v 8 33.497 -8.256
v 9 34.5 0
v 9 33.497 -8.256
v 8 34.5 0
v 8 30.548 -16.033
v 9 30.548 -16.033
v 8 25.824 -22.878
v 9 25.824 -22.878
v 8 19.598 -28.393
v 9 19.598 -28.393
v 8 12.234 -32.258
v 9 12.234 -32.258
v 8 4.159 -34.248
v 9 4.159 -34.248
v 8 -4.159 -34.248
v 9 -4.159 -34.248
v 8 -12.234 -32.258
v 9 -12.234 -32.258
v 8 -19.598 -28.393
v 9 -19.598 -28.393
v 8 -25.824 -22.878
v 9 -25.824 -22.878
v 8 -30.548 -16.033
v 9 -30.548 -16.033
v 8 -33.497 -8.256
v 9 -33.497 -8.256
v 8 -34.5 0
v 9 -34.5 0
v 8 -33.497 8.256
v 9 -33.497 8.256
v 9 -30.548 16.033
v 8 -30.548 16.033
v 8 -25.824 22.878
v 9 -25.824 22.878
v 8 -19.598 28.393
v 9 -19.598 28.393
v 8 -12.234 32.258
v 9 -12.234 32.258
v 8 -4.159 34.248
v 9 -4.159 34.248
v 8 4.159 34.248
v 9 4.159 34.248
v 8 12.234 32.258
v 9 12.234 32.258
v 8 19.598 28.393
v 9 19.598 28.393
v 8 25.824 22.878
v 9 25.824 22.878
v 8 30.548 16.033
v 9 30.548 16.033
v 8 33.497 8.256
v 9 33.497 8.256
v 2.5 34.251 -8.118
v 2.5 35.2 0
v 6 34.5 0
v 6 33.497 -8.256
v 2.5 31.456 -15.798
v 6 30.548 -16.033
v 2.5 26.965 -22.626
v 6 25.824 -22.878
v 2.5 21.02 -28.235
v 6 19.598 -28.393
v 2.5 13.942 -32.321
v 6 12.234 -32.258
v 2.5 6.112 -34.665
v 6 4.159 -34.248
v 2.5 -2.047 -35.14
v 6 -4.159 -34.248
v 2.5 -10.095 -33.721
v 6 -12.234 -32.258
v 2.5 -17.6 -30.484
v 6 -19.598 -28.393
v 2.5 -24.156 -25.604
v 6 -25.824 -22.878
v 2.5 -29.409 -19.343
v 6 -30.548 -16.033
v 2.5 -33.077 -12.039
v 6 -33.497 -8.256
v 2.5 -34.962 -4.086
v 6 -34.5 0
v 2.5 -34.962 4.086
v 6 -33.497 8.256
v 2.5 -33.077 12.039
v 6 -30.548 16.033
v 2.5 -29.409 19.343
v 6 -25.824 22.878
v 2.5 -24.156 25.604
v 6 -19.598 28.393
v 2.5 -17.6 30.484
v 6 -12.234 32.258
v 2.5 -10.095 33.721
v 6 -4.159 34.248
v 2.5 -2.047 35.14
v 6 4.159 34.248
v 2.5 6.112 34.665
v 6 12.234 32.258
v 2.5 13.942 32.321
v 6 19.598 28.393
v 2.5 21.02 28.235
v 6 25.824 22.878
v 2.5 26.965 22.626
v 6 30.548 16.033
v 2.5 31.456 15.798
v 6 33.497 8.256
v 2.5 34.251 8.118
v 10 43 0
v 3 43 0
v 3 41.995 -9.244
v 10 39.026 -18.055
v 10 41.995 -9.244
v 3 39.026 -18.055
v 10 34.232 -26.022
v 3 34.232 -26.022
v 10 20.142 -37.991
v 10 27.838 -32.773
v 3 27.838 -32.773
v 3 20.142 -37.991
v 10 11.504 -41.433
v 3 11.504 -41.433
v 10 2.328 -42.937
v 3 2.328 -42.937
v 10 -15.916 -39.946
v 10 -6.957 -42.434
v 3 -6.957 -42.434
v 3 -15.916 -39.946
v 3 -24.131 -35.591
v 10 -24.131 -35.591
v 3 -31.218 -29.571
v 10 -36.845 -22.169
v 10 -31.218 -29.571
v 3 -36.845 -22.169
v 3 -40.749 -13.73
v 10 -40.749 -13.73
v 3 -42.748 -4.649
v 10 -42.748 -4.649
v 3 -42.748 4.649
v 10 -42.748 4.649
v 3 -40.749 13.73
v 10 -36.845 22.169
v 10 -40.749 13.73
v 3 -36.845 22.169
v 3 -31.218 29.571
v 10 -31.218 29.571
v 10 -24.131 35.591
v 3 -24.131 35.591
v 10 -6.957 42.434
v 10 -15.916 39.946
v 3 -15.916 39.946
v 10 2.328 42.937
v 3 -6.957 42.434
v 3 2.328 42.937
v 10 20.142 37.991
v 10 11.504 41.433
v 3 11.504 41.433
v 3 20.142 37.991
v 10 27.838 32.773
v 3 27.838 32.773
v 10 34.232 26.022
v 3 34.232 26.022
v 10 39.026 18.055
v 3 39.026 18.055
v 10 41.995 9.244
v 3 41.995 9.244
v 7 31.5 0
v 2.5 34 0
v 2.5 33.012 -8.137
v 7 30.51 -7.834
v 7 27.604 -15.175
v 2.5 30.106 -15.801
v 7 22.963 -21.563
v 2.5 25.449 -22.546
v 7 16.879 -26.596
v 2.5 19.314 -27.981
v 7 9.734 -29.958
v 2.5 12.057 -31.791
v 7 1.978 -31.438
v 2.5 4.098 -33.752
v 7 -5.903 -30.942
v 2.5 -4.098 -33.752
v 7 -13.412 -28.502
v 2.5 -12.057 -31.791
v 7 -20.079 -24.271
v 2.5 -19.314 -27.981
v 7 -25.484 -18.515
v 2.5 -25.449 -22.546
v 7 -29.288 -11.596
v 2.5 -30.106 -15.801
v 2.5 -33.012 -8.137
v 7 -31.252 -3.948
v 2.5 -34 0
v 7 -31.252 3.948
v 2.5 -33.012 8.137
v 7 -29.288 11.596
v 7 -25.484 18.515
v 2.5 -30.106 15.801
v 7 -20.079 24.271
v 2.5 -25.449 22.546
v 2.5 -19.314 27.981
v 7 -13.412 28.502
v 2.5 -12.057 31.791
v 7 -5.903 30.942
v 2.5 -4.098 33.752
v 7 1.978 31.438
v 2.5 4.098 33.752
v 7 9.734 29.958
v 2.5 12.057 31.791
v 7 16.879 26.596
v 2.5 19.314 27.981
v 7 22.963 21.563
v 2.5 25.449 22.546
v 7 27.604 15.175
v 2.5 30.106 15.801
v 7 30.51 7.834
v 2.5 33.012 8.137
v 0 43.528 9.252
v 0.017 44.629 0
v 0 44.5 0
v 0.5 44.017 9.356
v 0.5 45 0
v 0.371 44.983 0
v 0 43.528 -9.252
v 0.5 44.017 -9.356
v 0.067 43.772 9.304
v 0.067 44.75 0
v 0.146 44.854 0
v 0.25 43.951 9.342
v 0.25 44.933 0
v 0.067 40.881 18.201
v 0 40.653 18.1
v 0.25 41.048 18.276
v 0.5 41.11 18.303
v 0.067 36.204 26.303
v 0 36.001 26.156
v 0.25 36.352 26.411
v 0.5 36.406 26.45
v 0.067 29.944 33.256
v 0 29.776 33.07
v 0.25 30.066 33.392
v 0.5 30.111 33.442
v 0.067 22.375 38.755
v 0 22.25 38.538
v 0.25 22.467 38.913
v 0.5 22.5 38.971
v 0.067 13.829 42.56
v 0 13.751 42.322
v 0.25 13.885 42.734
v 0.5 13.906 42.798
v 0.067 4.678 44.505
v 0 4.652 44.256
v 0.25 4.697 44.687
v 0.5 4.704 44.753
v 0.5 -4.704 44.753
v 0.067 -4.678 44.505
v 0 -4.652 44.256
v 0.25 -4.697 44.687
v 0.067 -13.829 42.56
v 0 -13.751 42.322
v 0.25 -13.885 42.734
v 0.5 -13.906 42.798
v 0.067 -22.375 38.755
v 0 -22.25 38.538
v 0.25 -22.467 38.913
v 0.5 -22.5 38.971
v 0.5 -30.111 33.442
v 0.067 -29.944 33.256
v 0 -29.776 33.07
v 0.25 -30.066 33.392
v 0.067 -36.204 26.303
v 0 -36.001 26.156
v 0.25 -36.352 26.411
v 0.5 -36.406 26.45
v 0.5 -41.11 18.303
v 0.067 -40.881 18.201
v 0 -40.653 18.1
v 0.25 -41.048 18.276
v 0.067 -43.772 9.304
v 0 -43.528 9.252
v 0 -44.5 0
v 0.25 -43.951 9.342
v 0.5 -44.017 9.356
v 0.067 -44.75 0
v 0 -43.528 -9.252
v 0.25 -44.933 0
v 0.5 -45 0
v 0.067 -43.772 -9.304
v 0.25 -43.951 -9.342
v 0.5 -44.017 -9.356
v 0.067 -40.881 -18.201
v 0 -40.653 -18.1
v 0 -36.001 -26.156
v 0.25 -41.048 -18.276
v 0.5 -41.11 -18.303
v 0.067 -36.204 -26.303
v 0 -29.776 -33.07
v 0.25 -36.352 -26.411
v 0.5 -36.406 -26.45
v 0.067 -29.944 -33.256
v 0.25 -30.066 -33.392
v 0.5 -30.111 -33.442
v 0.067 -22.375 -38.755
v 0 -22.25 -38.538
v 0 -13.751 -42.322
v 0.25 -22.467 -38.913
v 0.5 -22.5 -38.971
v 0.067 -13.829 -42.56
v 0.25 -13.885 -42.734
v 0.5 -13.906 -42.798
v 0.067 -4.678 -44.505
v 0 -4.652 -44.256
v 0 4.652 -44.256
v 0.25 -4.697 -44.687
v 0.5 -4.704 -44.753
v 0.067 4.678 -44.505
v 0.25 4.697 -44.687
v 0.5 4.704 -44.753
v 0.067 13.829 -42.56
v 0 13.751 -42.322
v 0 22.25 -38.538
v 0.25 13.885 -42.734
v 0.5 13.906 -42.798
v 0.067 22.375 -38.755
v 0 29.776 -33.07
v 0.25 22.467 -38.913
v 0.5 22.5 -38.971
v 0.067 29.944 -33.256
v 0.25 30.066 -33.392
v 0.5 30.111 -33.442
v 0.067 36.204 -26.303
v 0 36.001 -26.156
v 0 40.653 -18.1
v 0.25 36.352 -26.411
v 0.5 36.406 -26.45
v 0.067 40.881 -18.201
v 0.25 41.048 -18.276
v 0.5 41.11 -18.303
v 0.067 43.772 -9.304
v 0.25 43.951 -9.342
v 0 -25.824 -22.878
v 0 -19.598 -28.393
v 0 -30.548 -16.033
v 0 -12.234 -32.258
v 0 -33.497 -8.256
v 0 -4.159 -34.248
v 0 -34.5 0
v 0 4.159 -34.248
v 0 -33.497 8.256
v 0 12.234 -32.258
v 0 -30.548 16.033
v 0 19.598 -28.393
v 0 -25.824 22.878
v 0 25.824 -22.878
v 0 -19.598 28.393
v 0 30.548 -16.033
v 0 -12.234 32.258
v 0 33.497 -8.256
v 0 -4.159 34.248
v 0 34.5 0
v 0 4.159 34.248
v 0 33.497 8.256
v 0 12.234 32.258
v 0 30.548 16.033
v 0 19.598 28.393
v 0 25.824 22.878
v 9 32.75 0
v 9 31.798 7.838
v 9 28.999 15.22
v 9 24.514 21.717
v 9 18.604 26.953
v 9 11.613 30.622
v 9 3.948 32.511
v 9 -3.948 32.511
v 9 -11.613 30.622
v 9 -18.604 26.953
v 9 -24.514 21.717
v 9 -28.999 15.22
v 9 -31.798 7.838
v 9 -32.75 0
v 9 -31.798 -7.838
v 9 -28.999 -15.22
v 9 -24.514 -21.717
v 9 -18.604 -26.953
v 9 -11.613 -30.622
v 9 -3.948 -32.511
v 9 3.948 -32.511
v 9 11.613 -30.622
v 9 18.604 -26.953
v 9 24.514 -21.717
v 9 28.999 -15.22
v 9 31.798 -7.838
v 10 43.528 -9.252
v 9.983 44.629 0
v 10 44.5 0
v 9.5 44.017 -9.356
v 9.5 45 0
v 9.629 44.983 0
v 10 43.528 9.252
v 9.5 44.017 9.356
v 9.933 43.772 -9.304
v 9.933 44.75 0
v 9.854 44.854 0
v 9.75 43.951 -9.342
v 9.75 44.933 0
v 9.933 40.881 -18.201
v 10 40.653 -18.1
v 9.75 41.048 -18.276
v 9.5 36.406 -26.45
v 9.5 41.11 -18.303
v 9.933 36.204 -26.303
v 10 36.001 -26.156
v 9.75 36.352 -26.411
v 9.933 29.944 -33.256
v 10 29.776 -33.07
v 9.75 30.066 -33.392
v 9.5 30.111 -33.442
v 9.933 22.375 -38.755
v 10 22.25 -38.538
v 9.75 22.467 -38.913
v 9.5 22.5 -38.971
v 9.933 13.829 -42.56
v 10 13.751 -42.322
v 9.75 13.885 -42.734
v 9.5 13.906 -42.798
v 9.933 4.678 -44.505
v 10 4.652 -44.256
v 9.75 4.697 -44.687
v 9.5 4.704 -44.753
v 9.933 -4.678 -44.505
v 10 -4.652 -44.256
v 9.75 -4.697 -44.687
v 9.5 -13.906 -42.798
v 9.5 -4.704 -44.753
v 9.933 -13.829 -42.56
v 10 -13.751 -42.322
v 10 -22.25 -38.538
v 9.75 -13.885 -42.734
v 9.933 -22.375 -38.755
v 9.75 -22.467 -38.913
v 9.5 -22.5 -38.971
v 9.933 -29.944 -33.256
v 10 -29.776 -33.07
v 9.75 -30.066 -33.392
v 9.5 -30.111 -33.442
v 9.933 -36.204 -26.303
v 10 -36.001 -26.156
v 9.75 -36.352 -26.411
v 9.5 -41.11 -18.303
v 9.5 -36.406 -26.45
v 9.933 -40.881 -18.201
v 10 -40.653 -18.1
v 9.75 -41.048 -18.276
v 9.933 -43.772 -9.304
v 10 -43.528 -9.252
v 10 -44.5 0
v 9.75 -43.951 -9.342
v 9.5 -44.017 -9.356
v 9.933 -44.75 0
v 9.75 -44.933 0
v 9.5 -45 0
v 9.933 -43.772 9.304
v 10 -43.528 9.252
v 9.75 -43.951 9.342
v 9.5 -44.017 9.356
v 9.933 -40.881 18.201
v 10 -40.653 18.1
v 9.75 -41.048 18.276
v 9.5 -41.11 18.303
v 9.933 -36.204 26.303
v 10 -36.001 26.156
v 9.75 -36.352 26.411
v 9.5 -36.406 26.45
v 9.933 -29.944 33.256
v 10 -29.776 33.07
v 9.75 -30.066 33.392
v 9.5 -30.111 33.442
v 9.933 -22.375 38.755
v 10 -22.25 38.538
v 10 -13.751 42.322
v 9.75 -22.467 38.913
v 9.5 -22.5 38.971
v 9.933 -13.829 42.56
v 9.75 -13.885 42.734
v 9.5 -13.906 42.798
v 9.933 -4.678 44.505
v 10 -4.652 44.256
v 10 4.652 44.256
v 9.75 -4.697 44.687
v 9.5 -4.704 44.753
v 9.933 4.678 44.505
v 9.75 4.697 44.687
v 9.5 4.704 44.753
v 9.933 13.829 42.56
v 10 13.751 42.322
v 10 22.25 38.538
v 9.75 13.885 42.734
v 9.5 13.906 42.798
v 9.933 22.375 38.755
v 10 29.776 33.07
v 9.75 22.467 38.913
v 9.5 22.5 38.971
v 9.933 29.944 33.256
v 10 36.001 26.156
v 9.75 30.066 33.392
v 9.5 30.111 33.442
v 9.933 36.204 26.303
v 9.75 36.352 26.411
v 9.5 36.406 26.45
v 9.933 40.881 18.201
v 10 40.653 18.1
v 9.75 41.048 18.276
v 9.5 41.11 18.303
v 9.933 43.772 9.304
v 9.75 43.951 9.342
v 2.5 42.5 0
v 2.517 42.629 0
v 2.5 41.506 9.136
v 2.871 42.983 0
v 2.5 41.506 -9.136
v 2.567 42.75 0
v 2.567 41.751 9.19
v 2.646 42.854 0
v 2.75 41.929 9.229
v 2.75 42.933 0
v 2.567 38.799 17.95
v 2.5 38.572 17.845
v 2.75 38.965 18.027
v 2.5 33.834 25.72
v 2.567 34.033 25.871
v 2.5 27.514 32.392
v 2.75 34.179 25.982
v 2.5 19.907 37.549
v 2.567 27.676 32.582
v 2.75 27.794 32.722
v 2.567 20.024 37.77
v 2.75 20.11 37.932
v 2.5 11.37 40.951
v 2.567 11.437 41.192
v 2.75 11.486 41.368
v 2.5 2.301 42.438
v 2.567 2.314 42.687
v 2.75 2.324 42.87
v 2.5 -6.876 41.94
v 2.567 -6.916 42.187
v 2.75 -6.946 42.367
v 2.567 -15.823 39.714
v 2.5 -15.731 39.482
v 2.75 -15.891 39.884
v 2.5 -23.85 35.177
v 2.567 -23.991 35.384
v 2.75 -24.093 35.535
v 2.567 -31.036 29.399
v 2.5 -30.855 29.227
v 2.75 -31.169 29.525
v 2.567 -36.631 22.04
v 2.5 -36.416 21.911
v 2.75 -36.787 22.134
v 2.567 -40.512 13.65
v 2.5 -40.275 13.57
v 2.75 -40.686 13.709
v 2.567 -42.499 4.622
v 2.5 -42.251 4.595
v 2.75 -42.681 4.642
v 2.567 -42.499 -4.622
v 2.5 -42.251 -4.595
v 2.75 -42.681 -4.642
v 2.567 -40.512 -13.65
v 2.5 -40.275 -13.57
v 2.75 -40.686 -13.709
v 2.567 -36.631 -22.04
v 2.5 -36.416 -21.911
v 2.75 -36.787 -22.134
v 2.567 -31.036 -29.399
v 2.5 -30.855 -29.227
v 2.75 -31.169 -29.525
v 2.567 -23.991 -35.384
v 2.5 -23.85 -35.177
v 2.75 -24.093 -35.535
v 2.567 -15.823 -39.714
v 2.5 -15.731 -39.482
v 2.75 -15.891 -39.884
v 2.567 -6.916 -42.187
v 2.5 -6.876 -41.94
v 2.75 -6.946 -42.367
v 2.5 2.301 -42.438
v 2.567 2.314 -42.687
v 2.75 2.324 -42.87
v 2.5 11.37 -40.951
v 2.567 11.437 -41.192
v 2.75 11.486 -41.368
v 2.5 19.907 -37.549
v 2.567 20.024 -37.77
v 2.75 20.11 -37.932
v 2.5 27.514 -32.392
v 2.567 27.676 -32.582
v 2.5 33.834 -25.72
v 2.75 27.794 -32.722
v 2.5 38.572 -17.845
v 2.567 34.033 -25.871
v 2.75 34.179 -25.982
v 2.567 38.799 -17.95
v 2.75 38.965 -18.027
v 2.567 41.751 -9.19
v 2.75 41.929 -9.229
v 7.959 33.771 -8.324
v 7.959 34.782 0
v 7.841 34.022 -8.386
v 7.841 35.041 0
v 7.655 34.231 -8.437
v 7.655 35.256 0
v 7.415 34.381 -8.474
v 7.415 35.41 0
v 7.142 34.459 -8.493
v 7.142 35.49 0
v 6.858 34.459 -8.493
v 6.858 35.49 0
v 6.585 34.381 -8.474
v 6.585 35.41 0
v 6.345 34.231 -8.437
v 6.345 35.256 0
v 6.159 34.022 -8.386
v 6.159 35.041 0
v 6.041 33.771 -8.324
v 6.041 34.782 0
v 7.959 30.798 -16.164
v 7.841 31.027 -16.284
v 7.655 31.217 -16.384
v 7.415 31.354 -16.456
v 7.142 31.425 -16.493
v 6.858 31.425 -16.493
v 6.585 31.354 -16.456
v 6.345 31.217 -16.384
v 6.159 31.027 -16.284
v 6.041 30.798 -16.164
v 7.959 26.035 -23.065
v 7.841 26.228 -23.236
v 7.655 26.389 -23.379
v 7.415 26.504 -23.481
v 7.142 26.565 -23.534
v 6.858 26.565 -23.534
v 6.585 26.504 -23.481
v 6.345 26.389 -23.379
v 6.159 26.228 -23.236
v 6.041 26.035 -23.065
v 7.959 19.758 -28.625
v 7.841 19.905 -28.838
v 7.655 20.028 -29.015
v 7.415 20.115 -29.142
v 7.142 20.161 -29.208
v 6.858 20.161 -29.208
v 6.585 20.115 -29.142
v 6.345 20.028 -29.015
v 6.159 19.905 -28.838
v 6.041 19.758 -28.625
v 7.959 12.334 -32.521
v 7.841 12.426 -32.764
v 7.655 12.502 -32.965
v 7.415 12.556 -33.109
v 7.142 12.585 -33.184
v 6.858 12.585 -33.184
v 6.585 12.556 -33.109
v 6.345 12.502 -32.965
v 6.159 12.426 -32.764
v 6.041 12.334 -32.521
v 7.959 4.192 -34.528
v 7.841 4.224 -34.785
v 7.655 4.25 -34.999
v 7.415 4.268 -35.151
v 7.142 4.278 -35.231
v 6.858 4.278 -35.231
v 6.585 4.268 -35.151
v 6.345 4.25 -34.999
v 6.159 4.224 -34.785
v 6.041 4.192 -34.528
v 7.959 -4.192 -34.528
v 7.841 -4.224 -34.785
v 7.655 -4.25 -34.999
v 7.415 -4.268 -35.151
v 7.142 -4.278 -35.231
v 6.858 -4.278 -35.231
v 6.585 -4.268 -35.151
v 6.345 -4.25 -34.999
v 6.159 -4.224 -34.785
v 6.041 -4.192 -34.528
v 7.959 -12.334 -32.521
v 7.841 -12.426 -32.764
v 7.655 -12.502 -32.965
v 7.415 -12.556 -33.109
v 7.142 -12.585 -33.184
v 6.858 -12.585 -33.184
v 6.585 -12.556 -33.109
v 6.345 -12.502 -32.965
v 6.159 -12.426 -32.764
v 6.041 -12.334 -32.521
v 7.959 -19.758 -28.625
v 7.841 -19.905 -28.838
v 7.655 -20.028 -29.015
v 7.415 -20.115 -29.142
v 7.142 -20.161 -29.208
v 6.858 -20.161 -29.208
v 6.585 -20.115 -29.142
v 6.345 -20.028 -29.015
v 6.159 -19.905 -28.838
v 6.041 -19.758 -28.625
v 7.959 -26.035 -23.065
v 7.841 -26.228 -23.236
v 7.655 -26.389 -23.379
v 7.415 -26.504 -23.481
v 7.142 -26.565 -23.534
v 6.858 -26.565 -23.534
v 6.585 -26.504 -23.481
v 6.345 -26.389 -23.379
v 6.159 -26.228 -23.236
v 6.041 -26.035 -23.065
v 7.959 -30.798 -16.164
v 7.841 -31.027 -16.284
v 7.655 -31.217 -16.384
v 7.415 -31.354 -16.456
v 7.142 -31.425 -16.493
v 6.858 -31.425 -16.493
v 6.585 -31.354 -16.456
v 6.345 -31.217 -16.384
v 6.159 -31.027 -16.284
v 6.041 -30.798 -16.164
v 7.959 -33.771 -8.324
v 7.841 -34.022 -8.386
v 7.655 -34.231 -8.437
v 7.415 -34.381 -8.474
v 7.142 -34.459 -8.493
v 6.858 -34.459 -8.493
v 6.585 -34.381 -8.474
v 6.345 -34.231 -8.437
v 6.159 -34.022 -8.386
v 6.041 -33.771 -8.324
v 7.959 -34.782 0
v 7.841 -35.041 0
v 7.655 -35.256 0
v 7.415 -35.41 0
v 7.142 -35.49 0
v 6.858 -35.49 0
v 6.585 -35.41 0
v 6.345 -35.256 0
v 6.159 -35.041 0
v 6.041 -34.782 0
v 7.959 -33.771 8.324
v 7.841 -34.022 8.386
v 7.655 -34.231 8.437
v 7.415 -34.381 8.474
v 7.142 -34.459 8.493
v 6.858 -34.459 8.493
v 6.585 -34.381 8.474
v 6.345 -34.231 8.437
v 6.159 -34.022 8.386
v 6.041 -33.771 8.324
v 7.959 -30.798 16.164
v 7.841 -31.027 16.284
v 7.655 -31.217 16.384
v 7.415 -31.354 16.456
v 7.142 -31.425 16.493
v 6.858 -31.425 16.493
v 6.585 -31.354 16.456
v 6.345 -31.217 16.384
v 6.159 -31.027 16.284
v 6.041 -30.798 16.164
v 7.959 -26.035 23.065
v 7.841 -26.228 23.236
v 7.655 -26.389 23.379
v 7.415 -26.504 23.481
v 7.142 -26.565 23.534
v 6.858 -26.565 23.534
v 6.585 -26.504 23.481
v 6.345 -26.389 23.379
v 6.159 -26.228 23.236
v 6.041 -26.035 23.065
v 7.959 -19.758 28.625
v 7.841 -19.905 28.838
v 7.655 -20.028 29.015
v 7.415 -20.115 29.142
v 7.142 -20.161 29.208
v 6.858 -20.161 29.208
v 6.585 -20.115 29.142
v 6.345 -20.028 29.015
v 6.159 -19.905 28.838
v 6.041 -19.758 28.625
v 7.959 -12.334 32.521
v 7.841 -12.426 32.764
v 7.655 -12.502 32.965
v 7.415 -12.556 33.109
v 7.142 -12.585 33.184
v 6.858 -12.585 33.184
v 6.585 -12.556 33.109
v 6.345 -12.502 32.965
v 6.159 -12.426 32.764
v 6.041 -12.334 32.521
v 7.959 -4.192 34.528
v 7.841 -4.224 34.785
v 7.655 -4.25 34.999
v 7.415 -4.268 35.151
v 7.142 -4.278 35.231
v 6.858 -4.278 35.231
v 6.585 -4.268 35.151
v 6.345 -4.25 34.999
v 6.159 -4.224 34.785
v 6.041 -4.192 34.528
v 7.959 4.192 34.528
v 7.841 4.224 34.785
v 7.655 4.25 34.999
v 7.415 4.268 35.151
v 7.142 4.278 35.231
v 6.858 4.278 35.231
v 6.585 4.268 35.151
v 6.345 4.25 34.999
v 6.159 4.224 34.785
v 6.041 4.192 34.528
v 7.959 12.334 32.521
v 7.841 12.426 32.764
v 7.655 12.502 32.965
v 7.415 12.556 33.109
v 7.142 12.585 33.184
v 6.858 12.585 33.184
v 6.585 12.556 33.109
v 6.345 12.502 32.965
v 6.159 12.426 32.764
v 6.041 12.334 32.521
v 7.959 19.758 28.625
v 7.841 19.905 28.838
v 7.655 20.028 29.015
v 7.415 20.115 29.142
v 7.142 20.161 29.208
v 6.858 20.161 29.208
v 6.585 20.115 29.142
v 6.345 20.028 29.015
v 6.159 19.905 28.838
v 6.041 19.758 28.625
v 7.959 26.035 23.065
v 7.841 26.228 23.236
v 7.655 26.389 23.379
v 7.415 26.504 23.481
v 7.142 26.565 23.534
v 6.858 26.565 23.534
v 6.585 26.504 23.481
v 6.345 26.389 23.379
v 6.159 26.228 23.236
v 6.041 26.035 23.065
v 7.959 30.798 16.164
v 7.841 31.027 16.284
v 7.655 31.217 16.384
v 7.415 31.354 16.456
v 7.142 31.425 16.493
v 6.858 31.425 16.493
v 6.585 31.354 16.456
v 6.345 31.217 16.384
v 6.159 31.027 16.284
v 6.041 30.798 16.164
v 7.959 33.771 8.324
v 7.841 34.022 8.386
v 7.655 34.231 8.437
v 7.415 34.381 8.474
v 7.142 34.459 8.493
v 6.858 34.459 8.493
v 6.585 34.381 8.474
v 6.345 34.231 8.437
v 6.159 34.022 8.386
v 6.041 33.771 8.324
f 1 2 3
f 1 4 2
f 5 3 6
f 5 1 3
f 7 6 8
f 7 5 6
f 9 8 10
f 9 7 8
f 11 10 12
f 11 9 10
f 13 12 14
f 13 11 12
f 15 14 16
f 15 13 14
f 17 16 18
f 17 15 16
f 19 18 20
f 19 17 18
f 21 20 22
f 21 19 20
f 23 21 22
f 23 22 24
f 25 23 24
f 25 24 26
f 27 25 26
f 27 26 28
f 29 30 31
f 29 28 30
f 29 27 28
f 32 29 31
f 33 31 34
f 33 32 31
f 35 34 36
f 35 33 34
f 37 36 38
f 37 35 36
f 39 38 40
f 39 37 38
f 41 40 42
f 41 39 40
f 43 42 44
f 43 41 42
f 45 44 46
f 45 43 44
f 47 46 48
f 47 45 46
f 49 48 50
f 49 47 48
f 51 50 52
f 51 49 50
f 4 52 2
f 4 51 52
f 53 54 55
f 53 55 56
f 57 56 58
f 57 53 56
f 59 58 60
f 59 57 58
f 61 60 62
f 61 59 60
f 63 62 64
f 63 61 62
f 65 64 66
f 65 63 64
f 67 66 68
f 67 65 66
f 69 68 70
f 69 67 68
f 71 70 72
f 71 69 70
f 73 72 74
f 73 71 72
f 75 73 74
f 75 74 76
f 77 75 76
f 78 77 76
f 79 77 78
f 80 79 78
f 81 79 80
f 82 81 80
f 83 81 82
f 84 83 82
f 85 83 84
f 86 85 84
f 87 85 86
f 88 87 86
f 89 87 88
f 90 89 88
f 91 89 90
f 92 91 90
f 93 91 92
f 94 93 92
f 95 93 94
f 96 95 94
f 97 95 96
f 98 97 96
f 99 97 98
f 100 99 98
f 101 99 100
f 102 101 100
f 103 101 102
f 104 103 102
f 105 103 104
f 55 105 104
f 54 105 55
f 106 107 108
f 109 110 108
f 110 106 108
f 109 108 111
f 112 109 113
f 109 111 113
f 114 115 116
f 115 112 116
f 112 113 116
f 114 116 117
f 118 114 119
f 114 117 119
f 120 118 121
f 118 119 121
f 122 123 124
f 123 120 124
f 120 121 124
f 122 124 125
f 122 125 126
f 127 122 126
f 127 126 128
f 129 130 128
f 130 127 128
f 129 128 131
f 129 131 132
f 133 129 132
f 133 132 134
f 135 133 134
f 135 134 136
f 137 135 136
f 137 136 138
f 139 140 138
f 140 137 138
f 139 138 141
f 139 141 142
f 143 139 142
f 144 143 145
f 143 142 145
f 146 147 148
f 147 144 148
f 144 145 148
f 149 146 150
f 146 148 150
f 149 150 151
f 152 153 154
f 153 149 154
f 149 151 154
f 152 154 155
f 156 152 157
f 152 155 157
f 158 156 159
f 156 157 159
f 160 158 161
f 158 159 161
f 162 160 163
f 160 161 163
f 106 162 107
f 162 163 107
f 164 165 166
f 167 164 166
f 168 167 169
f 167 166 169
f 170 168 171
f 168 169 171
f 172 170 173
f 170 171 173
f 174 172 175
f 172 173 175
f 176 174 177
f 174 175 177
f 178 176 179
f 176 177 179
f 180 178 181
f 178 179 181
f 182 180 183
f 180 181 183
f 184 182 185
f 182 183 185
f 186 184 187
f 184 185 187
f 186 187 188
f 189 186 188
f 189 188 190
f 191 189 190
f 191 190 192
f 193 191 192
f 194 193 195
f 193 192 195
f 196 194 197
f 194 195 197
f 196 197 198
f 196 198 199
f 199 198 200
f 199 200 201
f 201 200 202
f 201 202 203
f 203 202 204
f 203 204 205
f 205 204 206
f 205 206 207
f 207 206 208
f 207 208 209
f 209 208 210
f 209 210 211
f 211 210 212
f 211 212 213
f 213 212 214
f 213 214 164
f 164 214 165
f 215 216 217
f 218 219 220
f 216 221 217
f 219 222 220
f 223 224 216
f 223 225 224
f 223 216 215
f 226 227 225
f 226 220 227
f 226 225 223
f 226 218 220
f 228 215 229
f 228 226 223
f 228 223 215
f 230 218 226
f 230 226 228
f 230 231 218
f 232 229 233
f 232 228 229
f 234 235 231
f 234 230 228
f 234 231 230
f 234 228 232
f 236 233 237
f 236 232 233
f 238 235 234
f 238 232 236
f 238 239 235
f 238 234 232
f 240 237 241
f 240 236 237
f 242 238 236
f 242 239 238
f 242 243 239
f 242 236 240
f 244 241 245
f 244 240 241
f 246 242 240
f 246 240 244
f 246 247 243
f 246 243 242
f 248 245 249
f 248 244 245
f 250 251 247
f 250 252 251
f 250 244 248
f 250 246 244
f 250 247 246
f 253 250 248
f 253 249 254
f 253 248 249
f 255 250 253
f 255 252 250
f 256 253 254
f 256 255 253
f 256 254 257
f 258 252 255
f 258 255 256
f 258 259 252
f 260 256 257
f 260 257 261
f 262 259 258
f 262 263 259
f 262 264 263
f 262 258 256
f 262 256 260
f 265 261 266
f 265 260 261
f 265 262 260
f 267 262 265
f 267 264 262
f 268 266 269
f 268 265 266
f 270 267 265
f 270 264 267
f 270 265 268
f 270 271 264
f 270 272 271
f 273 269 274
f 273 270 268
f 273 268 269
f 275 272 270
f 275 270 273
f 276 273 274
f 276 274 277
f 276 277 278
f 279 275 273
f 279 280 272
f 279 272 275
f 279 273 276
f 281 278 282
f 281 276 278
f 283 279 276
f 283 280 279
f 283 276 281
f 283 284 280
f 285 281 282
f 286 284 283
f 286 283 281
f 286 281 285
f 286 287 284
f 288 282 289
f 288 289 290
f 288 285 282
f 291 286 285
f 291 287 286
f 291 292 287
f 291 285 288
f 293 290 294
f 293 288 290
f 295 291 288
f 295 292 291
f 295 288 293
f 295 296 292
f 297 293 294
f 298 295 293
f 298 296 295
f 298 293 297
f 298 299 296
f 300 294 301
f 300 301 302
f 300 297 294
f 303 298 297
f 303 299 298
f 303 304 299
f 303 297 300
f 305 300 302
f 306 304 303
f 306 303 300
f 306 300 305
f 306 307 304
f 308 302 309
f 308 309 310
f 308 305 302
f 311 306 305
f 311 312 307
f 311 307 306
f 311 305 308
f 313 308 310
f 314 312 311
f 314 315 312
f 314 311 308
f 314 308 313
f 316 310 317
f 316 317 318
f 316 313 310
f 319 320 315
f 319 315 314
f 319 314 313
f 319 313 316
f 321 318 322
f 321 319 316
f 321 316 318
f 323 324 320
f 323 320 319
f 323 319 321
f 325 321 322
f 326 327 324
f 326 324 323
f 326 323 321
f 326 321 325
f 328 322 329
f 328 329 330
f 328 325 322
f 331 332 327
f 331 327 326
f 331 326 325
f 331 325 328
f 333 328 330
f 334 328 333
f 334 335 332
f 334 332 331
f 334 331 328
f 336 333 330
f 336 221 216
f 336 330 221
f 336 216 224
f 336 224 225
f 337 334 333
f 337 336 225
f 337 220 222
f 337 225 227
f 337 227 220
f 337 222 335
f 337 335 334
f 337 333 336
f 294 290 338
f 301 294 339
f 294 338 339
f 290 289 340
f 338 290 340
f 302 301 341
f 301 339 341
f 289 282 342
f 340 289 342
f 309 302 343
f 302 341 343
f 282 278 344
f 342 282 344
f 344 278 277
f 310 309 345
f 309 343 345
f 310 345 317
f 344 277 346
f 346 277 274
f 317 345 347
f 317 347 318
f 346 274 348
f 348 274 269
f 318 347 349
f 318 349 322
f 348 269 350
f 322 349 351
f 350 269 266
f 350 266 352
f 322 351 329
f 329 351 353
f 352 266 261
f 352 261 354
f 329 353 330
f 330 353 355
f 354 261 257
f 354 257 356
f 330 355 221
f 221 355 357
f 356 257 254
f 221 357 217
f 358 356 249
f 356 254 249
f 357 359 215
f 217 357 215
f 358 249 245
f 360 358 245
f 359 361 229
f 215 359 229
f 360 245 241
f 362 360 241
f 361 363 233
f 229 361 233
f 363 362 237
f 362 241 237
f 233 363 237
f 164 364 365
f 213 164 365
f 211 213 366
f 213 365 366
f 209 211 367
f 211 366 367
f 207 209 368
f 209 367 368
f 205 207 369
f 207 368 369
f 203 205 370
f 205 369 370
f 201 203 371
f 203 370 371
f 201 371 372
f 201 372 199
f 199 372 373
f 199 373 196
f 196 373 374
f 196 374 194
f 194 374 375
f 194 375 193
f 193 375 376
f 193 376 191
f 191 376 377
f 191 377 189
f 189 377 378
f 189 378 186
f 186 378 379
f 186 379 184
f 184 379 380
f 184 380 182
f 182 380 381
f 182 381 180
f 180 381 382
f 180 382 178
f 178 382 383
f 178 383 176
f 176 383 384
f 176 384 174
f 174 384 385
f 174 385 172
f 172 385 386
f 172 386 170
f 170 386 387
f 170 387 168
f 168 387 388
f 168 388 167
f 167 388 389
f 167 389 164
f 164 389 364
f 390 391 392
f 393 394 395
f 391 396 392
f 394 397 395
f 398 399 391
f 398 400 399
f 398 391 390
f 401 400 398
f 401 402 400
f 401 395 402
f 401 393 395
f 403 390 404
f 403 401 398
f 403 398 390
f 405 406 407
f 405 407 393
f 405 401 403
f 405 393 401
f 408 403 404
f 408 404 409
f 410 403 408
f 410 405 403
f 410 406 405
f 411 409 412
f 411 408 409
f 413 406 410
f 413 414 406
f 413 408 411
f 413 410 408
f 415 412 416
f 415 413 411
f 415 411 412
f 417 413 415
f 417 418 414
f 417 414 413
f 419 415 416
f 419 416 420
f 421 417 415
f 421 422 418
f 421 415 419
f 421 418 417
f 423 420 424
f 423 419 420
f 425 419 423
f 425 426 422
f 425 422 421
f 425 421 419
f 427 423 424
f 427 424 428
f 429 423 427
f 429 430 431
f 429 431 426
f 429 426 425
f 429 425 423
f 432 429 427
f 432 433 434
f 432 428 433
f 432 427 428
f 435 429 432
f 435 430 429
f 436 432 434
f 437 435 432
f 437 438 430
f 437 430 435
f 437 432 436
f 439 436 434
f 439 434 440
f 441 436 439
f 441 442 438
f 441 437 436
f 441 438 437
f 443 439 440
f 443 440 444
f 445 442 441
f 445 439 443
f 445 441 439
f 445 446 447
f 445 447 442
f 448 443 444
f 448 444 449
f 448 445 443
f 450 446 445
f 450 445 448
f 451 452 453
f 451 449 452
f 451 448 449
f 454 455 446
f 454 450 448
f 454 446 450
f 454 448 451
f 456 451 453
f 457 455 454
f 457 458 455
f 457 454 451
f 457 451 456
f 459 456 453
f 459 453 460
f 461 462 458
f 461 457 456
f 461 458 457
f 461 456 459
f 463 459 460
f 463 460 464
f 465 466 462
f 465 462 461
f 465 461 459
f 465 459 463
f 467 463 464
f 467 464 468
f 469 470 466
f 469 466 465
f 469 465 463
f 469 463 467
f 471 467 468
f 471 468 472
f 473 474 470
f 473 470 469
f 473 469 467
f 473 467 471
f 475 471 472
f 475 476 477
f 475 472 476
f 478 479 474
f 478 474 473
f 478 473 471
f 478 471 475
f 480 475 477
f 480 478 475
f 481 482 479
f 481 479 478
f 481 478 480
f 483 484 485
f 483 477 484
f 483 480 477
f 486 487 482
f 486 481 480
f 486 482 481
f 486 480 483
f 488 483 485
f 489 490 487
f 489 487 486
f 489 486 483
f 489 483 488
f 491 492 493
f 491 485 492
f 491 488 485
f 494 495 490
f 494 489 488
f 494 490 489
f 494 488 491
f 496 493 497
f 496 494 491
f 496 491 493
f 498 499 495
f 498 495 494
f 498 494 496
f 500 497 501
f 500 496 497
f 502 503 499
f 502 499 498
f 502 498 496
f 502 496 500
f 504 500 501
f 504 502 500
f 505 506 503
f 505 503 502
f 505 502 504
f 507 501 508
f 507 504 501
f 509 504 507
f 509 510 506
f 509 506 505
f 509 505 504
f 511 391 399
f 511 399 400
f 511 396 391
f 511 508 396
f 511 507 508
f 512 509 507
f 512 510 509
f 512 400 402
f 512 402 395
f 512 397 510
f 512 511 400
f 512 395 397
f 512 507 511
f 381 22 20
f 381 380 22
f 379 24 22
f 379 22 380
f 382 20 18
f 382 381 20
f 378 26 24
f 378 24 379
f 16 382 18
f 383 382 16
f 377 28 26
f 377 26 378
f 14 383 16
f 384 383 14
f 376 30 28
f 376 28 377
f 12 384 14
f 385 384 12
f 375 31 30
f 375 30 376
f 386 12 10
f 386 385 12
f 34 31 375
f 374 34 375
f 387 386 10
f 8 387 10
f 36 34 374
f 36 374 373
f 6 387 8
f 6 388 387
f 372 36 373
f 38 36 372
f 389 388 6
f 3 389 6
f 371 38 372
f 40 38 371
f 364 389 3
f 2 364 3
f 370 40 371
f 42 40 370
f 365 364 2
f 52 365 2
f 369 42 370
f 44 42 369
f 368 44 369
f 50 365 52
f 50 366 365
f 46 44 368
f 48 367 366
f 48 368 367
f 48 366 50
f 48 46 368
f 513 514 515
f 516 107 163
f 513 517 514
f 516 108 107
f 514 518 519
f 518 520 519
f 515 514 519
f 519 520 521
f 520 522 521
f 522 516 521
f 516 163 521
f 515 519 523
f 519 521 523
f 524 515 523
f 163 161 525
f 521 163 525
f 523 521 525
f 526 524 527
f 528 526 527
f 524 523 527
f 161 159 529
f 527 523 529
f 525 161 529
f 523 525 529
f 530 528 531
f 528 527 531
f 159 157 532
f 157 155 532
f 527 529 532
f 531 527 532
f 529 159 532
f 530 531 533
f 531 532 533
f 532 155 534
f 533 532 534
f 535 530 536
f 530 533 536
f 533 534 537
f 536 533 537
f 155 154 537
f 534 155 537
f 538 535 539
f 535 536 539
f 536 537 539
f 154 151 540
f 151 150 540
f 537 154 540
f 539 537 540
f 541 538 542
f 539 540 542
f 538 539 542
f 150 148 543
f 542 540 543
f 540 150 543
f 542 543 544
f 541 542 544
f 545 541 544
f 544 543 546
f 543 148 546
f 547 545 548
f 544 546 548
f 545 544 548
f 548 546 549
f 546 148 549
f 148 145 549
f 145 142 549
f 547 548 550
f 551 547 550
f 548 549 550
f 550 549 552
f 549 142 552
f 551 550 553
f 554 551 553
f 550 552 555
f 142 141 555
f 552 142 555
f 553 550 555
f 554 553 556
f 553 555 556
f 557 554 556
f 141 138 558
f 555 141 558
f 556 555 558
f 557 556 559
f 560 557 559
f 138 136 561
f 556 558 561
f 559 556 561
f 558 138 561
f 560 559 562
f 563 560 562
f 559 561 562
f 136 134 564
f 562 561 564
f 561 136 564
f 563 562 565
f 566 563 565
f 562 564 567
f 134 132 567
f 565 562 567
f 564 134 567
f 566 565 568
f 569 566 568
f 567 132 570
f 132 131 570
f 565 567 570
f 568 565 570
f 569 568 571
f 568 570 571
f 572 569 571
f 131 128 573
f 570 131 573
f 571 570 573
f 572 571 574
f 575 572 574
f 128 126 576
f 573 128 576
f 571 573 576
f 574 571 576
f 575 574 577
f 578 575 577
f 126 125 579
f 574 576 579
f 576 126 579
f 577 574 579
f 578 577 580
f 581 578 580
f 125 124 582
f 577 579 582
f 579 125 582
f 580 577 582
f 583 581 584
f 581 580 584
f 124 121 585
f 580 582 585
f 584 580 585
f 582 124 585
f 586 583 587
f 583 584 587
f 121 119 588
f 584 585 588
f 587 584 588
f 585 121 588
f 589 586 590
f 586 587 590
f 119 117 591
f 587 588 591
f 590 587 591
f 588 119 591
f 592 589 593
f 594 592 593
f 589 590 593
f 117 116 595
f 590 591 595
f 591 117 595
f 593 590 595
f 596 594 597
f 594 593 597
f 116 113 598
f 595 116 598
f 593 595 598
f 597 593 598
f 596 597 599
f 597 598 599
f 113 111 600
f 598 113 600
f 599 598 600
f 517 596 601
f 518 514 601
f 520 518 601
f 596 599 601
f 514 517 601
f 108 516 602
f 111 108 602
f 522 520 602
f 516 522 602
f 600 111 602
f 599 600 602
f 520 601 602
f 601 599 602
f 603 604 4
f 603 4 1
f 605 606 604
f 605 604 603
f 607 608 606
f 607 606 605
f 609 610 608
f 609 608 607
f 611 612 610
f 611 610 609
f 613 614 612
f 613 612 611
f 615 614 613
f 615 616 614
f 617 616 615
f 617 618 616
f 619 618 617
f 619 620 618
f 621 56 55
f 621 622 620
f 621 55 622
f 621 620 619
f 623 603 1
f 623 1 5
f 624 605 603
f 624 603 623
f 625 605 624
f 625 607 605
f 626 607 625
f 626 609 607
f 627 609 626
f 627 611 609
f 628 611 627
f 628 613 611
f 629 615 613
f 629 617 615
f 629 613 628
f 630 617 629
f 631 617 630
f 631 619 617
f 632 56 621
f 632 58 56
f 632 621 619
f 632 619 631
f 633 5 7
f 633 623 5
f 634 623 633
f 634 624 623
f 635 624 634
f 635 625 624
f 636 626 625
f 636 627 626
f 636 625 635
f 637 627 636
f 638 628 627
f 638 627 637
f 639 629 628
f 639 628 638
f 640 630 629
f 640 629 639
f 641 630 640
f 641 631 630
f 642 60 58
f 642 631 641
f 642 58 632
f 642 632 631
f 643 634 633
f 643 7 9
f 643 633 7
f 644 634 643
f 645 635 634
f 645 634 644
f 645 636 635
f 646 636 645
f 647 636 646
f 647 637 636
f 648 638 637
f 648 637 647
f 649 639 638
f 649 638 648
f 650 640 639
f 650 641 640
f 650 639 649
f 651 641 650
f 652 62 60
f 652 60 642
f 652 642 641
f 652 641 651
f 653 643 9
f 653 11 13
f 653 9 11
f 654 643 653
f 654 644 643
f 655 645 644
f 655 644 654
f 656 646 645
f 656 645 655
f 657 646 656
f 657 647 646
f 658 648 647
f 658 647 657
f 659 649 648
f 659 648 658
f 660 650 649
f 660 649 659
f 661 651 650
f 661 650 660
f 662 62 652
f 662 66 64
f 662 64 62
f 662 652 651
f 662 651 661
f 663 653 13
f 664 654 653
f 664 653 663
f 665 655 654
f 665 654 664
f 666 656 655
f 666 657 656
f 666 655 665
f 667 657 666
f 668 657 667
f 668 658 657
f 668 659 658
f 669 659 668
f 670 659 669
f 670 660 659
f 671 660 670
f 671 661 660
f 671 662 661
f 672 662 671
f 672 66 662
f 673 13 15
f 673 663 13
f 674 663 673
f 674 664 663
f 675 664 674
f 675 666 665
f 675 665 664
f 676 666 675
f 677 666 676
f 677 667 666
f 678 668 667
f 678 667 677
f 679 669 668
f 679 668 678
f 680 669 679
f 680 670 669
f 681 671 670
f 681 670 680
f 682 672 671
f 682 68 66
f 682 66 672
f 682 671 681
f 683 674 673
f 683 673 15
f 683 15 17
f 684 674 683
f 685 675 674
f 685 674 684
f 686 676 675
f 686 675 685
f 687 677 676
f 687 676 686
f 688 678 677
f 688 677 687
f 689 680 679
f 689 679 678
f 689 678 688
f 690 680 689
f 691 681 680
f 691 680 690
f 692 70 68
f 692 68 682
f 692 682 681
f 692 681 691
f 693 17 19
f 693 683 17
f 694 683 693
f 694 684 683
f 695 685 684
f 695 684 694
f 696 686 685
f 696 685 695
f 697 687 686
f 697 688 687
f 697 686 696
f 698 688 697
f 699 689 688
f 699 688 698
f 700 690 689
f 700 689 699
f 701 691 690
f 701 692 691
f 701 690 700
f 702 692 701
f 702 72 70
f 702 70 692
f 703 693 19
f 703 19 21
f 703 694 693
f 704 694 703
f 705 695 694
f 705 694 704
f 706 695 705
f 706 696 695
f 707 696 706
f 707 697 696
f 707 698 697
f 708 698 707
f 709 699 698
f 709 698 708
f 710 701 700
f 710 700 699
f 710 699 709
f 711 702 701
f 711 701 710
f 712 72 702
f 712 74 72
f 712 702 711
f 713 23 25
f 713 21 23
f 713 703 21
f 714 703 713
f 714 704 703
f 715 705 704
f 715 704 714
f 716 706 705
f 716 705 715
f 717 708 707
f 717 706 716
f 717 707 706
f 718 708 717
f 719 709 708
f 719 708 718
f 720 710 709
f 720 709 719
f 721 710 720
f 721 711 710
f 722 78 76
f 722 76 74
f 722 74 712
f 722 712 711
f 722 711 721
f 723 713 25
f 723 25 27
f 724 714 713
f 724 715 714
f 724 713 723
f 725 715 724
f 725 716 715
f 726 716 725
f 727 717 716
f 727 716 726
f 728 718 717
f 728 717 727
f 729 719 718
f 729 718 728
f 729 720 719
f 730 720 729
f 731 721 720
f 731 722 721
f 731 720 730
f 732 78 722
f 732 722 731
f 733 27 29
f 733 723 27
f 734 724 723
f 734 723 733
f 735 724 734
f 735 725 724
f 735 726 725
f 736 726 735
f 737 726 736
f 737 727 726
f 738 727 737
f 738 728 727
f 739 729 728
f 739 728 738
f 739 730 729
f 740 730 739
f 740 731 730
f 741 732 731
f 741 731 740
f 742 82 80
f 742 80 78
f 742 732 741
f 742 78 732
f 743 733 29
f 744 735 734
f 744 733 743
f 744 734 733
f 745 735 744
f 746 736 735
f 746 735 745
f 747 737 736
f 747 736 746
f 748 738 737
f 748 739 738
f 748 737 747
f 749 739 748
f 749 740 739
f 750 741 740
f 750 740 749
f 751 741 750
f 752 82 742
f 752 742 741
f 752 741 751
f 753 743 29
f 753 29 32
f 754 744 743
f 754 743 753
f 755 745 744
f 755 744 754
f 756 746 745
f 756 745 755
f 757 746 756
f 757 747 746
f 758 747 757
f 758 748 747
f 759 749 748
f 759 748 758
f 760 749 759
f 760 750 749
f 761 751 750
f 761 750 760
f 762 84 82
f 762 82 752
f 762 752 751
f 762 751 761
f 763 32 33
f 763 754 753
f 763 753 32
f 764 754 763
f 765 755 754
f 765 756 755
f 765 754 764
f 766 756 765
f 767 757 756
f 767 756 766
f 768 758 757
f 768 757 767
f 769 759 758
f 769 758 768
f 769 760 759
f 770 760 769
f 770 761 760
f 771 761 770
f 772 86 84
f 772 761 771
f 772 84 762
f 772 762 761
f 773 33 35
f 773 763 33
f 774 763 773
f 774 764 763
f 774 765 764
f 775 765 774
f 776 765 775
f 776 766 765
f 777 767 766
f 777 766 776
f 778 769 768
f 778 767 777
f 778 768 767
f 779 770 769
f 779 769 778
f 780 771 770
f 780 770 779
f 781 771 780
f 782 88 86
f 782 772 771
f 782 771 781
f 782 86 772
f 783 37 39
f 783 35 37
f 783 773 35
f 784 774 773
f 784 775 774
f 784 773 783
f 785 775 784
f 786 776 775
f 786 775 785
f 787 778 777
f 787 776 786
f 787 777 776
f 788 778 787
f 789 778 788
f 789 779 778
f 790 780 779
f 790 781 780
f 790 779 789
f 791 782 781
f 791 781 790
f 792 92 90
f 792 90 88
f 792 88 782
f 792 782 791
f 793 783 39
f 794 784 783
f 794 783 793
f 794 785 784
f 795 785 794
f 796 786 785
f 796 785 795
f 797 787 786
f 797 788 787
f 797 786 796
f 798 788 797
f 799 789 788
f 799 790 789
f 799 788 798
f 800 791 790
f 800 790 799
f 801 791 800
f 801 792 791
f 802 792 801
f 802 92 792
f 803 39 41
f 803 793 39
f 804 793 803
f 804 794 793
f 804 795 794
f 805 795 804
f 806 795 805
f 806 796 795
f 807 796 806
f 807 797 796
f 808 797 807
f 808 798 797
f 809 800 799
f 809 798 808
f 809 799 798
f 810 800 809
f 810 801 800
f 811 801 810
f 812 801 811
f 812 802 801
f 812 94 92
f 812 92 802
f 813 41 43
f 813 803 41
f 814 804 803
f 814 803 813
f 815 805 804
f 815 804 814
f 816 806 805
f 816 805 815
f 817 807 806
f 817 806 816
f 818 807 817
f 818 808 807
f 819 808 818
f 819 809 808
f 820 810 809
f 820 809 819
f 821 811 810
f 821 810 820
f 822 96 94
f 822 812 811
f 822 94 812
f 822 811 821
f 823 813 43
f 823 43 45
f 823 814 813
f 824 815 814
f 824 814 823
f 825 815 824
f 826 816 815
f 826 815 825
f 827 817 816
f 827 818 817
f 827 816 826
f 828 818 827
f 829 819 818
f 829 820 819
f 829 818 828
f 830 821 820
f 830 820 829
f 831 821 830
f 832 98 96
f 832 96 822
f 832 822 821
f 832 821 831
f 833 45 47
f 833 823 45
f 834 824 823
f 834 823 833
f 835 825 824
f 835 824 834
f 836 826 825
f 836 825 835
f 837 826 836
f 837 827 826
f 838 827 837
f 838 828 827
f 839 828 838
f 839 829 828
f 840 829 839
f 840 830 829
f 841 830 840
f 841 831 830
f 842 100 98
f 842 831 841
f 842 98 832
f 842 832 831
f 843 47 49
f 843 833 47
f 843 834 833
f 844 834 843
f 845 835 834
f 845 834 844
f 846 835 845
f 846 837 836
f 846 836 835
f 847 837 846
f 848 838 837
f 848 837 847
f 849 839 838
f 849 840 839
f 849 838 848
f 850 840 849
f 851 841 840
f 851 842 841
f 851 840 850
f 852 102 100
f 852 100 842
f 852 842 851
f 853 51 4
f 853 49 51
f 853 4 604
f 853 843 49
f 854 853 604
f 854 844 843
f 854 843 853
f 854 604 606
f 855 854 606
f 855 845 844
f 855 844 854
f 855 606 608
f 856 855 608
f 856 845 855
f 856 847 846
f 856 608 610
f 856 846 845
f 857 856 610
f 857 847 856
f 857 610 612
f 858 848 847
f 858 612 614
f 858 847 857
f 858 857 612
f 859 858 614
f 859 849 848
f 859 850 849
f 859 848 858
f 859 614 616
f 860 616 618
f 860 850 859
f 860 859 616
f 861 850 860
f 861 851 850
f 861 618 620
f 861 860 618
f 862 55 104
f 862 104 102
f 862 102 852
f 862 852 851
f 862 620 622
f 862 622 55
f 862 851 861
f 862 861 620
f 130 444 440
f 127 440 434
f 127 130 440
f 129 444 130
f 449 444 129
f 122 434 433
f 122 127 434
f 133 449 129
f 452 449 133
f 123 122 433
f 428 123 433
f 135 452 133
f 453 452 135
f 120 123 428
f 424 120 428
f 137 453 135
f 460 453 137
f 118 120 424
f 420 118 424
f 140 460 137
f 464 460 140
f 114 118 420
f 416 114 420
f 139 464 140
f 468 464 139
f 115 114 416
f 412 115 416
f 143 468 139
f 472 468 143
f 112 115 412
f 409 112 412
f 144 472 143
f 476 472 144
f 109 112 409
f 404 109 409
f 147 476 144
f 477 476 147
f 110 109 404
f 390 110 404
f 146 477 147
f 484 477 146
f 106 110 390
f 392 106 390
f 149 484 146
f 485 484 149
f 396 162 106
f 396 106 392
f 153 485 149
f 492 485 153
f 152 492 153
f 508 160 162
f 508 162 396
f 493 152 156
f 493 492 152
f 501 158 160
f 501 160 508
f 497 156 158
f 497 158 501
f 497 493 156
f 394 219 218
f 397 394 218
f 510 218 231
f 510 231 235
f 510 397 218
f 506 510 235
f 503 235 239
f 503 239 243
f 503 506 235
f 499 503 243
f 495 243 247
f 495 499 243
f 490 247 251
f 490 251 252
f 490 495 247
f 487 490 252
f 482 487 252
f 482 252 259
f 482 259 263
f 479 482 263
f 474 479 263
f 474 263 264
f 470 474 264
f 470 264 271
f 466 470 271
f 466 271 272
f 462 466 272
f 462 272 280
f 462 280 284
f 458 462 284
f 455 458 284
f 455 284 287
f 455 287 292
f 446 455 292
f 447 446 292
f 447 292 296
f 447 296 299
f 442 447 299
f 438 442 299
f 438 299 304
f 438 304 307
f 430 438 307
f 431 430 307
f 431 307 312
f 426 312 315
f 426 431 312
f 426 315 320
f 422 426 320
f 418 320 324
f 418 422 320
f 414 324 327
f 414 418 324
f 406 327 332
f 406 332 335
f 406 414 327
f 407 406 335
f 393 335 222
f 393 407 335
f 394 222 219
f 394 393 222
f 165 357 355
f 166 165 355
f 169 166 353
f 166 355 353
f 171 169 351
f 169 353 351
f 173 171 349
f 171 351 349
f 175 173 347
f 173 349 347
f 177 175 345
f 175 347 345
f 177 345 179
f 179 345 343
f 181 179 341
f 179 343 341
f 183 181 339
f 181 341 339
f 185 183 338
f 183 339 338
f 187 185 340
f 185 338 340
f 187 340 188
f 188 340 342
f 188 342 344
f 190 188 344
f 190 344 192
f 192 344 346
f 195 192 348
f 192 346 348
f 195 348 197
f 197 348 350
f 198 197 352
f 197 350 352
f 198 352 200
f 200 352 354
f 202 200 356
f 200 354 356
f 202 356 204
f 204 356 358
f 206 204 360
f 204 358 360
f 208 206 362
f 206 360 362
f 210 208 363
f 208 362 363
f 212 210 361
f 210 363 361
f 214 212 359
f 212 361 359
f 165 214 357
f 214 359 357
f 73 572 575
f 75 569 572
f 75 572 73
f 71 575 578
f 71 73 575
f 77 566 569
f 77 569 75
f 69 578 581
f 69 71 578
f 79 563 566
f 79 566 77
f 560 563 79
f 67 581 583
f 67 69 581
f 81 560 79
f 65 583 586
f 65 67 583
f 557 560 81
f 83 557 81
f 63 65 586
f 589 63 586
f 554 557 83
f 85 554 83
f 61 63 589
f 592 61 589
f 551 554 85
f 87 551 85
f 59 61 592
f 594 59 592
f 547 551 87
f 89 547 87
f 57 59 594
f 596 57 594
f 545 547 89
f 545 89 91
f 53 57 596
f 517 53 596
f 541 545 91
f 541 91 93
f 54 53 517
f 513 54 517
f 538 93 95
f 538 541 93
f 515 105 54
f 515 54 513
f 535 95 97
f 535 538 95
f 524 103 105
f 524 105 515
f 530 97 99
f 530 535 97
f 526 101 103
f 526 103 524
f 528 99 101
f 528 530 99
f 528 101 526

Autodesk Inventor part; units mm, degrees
ref_plane "YZ Plane" through (0, 0, 0) normal (1, 0, 0) x (0, 1, 0)
ref_plane "XZ Plane" through (0, 0, 0) normal (0, 1, 0) x (-1, 0, 0)
ref_plane "XY Plane" through (0, 0, 0) normal (0, 0, 1) x (1, 0, 0)
sketch "Skizze1" plane through (0, 0, 0) normal (0, 0, 1) x (1, 0, 0)
  circle A0 centre (7, 34.5) radius 0.65
  circle A1 centre (7, 34.5) radius 1
  line L0 (9, 32.75) -> (9, 34.5)
  line L1 (0, 45) -> (10, 45)
  line L2 (10, 45) -> (10, 43)
  line L3 (10, 43) -> (2.5, 43)
  line L4 (0, 0) -> (9.5856, 0)
  line L5 (0, 45) -> (0, 34.5)
  line L6 (0, 34.5) -> (2.5, 34)
  line L7 (2.5, 34) -> (7, 31.5)
  line L8 (7, 31.5) -> (9, 32.75)
  line L9 (7, 31.5) -> (0, 31.5) construction
  line L10 (0, 18) -> (0, -3) projected
  line L11 (-1.9171, 0) -> (11.5027, 0) projected
  line L12 (6, 34.5) -> (2.5, 35.2)
  line L13 (2.5, 35.2) -> (2.5, 43)
  line L14 (9, 34.5) -> (8, 34.5)
  dimension "d0" = 90
  dimension "d1" = 65.5
  dimension "d2" = 2
  dimension "d3" = 1.3
  dimension "d4" = 2
  dimension "d5" = 63
  dimension "d6" = 68
  dimension "d7" = 69
  dimension "d8" = 7
  dimension "d9" = 9
  dimension "d10" = 10
  dimension "d12" = 2.5
revolve "Körper" add sketch "Skizze1" angle 360 about axis through (0, 0, 0) along (1, 0, 0) contours L14 L0 L8 L7 L6 L5 L1 L2 L3 L13 L12 A1
revolve "Feder1" add sketch "Skizze1" angle 360 about axis through (0, 0, 0) along (1, 0, 0) contours A0 | A1
fillet "Rundung1" radius 0.5 3 edges at (10, -45, 0) (2.5, -43, 0) (0, -45, 0)
equation "\"d0\" = SD2"
equation "\"d1\" = ABDM"
equation "\"d3\" = SPDI"
equation "\"d4\" = SPDA"
equation "\"d5\" = NND"
equation "\"d6\" = TKDM"
equation "\"d7\" = HLDM"
equation "\"d8\" = SPDST"
equation "\"d9\" = SDI"
equation "\"d10\" = SWDT"
equation "\"d12\" = SD"
equation "\"d11\" = RR"
equation "\"SD2\" = 90"
equation "\"SWDT\" = 10"
equation "\"RR\" = 0.5"
equation "\"SD\" = 2.5"
equation "\"NND\" = 63"
equation "\"SPDA\" = 2"
equation "\"SPDI\" = 1.3"
equation "\"TKDM\" = 68"
equation "\"HLDM\" = 69"
equation "\"ABDM\" = 65.5"
equation "\"SDI\" = 9"
equation "\"SPDST\" = 7"
equation "\"LAB\" = 0.5"
properties part number "DIN 3760 - A - 63 x 90 x 10 - NBR" material "Gummi"
